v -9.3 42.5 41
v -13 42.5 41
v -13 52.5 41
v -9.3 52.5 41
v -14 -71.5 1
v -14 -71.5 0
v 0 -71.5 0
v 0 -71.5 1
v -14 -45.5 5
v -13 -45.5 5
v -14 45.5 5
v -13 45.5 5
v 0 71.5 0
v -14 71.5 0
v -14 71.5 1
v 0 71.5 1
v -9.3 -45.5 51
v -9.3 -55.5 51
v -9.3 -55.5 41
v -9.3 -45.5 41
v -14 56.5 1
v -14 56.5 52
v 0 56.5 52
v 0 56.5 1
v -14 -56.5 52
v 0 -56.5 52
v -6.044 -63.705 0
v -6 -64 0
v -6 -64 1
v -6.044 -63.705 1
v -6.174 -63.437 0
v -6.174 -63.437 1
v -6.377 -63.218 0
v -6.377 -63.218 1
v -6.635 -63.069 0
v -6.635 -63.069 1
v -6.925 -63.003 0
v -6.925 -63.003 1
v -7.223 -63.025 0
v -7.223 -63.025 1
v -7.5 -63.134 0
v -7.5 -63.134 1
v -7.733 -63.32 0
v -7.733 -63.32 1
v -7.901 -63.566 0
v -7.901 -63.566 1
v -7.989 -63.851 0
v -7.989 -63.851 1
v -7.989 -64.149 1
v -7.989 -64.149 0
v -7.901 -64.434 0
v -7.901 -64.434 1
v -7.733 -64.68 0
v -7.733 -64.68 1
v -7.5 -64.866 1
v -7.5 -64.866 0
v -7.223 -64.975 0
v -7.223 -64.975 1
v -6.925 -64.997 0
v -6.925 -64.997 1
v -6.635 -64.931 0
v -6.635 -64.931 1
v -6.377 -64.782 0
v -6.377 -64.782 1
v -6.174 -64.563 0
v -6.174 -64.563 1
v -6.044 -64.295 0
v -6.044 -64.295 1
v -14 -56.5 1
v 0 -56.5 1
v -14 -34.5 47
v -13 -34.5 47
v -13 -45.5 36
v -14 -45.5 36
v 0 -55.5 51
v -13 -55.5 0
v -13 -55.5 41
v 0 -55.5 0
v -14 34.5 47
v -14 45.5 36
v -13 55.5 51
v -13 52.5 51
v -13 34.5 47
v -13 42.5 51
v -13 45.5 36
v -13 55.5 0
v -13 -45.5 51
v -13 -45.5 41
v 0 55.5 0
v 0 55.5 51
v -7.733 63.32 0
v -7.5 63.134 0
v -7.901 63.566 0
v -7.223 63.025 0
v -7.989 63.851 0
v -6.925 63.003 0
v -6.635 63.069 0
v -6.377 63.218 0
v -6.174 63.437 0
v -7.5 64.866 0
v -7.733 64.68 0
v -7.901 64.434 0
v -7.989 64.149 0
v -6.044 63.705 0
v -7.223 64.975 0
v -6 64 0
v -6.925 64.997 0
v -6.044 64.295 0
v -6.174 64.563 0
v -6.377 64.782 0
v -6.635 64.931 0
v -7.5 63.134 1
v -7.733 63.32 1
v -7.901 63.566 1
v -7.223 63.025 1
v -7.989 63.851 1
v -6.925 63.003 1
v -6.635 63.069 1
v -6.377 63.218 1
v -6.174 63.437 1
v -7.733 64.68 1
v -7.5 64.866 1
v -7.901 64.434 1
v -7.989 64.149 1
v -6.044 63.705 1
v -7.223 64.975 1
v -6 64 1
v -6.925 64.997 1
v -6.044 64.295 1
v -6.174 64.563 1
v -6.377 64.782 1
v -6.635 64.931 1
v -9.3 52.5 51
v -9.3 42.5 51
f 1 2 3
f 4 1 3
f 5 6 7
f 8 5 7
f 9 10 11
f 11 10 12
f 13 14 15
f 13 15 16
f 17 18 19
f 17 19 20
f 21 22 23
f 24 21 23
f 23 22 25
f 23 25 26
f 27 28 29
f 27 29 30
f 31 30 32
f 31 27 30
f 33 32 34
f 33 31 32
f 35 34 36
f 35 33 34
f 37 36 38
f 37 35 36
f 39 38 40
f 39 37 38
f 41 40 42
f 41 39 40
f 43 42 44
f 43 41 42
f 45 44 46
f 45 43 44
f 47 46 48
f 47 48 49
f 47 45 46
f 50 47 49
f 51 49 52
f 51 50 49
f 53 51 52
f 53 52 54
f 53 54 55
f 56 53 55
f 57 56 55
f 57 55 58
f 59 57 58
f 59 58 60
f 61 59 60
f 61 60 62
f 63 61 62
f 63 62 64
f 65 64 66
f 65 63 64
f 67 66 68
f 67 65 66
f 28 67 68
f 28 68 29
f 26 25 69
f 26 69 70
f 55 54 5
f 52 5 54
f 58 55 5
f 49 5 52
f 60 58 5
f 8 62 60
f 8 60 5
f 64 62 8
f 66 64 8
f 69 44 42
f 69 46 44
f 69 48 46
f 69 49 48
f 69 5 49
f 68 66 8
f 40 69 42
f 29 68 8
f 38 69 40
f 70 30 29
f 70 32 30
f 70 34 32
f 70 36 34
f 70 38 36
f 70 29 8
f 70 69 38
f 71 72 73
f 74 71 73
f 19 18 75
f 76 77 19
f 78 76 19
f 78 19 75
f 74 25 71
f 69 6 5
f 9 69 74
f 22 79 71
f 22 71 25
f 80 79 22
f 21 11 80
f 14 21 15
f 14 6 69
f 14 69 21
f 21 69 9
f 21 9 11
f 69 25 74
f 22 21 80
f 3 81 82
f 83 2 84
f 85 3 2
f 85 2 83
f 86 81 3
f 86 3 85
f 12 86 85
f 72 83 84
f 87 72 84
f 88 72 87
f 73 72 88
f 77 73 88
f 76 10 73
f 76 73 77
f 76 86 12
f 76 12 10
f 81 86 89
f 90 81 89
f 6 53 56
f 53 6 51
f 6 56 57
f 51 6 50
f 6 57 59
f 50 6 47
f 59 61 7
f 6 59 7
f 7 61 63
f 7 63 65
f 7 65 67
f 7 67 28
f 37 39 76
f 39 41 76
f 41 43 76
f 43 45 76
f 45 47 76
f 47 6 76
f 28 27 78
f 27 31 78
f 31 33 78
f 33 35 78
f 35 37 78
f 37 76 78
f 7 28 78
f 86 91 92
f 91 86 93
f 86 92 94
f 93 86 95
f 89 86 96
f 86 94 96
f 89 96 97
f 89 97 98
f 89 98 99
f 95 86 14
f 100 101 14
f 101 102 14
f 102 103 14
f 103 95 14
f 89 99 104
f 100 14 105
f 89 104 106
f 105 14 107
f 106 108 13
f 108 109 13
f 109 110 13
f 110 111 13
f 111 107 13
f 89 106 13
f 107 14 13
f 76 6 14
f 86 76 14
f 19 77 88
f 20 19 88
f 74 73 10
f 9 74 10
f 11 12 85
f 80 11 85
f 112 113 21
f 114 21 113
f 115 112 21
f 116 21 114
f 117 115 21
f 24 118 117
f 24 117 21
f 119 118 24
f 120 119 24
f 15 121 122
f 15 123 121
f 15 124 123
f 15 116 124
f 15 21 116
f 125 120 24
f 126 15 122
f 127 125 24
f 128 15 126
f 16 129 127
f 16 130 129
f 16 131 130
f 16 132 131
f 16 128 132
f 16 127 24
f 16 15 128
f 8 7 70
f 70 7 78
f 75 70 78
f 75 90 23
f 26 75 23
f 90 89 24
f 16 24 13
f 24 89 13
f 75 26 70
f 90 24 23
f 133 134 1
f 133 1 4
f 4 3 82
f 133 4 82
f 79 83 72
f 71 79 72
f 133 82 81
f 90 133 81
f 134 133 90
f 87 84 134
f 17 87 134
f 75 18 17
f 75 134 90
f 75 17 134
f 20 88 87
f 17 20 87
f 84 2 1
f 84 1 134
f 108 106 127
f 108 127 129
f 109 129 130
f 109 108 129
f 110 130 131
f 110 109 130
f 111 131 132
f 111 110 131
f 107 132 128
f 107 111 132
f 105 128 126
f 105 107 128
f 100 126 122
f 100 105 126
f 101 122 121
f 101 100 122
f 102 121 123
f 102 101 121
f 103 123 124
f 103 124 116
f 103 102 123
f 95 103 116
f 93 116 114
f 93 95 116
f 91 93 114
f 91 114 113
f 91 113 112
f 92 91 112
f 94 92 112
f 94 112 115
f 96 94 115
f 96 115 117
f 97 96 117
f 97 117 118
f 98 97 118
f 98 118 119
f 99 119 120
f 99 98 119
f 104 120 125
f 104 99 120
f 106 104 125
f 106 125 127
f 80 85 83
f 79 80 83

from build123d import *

# Parameters (mm, degrees)
F0_W     = 14
F0_H     = 113
F1_DEPTH = 52
F2_W     = 13
F2_H     = 111
F3_DEPTH = 51
F4_W     = 14
F4_H     = 15
F4_R     = 1
F5_DEPTH = 1
F7_DEPTH = 1
F8_W     = 10
F8_H     = 10
F9_DEPTH = 3.7


with BuildPart() as f1:
    # F0 (on Top) → F1 (new body)
    with BuildSketch(Plane.XY):
        with Locations((-7, 0)):
            Rectangle(F0_W, F0_H)
    extrude(amount=F1_DEPTH)

    # F2 (on face) → F3 (cut)
    with BuildSketch(Plane(origin=(0, 0, 0), x_dir=(1, 0, 0), z_dir=(0, 0, -1))):
        with Locations((-6.5, 0)):
            Rectangle(F2_W, F2_H)
    extrude(amount=-F3_DEPTH, mode=Mode.SUBTRACT)

    # F4 (on Top) → F5 (join)
    with BuildSketch(Plane.XY):
        with Locations((-7, 64)):
            Rectangle(F4_W, F4_H)
        with Locations((-7, 64)):
            Circle(F4_R, mode=Mode.SUBTRACT)
        with Locations((-7, -64)):
            Rectangle(F4_W, F4_H)
        with Locations((-7, -64)):
            Circle(F4_R, mode=Mode.SUBTRACT)
    extrude(amount=F5_DEPTH)

    # F6 (on face) → F7 (cut)
    with BuildSketch(Plane.YZ.offset(-13)):
        Polygon((-45.5, 36), (-45.5, 5), (45.5, 5), (45.5, 36), (34.5, 47), (-34.5, 47), align=None)
    extrude(amount=-F7_DEPTH, mode=Mode.SUBTRACT)

    # F8 (on face) → F9 (join)
    with BuildSketch(Plane.YZ.offset(-13)):
        with Locations((-50.5, 46)):
            Rectangle(F8_W, F8_H)
        with Locations((47.5, 46)):
            Rectangle(F8_W, F8_H)
    extrude(amount=F9_DEPTH)


solid = f1.part
